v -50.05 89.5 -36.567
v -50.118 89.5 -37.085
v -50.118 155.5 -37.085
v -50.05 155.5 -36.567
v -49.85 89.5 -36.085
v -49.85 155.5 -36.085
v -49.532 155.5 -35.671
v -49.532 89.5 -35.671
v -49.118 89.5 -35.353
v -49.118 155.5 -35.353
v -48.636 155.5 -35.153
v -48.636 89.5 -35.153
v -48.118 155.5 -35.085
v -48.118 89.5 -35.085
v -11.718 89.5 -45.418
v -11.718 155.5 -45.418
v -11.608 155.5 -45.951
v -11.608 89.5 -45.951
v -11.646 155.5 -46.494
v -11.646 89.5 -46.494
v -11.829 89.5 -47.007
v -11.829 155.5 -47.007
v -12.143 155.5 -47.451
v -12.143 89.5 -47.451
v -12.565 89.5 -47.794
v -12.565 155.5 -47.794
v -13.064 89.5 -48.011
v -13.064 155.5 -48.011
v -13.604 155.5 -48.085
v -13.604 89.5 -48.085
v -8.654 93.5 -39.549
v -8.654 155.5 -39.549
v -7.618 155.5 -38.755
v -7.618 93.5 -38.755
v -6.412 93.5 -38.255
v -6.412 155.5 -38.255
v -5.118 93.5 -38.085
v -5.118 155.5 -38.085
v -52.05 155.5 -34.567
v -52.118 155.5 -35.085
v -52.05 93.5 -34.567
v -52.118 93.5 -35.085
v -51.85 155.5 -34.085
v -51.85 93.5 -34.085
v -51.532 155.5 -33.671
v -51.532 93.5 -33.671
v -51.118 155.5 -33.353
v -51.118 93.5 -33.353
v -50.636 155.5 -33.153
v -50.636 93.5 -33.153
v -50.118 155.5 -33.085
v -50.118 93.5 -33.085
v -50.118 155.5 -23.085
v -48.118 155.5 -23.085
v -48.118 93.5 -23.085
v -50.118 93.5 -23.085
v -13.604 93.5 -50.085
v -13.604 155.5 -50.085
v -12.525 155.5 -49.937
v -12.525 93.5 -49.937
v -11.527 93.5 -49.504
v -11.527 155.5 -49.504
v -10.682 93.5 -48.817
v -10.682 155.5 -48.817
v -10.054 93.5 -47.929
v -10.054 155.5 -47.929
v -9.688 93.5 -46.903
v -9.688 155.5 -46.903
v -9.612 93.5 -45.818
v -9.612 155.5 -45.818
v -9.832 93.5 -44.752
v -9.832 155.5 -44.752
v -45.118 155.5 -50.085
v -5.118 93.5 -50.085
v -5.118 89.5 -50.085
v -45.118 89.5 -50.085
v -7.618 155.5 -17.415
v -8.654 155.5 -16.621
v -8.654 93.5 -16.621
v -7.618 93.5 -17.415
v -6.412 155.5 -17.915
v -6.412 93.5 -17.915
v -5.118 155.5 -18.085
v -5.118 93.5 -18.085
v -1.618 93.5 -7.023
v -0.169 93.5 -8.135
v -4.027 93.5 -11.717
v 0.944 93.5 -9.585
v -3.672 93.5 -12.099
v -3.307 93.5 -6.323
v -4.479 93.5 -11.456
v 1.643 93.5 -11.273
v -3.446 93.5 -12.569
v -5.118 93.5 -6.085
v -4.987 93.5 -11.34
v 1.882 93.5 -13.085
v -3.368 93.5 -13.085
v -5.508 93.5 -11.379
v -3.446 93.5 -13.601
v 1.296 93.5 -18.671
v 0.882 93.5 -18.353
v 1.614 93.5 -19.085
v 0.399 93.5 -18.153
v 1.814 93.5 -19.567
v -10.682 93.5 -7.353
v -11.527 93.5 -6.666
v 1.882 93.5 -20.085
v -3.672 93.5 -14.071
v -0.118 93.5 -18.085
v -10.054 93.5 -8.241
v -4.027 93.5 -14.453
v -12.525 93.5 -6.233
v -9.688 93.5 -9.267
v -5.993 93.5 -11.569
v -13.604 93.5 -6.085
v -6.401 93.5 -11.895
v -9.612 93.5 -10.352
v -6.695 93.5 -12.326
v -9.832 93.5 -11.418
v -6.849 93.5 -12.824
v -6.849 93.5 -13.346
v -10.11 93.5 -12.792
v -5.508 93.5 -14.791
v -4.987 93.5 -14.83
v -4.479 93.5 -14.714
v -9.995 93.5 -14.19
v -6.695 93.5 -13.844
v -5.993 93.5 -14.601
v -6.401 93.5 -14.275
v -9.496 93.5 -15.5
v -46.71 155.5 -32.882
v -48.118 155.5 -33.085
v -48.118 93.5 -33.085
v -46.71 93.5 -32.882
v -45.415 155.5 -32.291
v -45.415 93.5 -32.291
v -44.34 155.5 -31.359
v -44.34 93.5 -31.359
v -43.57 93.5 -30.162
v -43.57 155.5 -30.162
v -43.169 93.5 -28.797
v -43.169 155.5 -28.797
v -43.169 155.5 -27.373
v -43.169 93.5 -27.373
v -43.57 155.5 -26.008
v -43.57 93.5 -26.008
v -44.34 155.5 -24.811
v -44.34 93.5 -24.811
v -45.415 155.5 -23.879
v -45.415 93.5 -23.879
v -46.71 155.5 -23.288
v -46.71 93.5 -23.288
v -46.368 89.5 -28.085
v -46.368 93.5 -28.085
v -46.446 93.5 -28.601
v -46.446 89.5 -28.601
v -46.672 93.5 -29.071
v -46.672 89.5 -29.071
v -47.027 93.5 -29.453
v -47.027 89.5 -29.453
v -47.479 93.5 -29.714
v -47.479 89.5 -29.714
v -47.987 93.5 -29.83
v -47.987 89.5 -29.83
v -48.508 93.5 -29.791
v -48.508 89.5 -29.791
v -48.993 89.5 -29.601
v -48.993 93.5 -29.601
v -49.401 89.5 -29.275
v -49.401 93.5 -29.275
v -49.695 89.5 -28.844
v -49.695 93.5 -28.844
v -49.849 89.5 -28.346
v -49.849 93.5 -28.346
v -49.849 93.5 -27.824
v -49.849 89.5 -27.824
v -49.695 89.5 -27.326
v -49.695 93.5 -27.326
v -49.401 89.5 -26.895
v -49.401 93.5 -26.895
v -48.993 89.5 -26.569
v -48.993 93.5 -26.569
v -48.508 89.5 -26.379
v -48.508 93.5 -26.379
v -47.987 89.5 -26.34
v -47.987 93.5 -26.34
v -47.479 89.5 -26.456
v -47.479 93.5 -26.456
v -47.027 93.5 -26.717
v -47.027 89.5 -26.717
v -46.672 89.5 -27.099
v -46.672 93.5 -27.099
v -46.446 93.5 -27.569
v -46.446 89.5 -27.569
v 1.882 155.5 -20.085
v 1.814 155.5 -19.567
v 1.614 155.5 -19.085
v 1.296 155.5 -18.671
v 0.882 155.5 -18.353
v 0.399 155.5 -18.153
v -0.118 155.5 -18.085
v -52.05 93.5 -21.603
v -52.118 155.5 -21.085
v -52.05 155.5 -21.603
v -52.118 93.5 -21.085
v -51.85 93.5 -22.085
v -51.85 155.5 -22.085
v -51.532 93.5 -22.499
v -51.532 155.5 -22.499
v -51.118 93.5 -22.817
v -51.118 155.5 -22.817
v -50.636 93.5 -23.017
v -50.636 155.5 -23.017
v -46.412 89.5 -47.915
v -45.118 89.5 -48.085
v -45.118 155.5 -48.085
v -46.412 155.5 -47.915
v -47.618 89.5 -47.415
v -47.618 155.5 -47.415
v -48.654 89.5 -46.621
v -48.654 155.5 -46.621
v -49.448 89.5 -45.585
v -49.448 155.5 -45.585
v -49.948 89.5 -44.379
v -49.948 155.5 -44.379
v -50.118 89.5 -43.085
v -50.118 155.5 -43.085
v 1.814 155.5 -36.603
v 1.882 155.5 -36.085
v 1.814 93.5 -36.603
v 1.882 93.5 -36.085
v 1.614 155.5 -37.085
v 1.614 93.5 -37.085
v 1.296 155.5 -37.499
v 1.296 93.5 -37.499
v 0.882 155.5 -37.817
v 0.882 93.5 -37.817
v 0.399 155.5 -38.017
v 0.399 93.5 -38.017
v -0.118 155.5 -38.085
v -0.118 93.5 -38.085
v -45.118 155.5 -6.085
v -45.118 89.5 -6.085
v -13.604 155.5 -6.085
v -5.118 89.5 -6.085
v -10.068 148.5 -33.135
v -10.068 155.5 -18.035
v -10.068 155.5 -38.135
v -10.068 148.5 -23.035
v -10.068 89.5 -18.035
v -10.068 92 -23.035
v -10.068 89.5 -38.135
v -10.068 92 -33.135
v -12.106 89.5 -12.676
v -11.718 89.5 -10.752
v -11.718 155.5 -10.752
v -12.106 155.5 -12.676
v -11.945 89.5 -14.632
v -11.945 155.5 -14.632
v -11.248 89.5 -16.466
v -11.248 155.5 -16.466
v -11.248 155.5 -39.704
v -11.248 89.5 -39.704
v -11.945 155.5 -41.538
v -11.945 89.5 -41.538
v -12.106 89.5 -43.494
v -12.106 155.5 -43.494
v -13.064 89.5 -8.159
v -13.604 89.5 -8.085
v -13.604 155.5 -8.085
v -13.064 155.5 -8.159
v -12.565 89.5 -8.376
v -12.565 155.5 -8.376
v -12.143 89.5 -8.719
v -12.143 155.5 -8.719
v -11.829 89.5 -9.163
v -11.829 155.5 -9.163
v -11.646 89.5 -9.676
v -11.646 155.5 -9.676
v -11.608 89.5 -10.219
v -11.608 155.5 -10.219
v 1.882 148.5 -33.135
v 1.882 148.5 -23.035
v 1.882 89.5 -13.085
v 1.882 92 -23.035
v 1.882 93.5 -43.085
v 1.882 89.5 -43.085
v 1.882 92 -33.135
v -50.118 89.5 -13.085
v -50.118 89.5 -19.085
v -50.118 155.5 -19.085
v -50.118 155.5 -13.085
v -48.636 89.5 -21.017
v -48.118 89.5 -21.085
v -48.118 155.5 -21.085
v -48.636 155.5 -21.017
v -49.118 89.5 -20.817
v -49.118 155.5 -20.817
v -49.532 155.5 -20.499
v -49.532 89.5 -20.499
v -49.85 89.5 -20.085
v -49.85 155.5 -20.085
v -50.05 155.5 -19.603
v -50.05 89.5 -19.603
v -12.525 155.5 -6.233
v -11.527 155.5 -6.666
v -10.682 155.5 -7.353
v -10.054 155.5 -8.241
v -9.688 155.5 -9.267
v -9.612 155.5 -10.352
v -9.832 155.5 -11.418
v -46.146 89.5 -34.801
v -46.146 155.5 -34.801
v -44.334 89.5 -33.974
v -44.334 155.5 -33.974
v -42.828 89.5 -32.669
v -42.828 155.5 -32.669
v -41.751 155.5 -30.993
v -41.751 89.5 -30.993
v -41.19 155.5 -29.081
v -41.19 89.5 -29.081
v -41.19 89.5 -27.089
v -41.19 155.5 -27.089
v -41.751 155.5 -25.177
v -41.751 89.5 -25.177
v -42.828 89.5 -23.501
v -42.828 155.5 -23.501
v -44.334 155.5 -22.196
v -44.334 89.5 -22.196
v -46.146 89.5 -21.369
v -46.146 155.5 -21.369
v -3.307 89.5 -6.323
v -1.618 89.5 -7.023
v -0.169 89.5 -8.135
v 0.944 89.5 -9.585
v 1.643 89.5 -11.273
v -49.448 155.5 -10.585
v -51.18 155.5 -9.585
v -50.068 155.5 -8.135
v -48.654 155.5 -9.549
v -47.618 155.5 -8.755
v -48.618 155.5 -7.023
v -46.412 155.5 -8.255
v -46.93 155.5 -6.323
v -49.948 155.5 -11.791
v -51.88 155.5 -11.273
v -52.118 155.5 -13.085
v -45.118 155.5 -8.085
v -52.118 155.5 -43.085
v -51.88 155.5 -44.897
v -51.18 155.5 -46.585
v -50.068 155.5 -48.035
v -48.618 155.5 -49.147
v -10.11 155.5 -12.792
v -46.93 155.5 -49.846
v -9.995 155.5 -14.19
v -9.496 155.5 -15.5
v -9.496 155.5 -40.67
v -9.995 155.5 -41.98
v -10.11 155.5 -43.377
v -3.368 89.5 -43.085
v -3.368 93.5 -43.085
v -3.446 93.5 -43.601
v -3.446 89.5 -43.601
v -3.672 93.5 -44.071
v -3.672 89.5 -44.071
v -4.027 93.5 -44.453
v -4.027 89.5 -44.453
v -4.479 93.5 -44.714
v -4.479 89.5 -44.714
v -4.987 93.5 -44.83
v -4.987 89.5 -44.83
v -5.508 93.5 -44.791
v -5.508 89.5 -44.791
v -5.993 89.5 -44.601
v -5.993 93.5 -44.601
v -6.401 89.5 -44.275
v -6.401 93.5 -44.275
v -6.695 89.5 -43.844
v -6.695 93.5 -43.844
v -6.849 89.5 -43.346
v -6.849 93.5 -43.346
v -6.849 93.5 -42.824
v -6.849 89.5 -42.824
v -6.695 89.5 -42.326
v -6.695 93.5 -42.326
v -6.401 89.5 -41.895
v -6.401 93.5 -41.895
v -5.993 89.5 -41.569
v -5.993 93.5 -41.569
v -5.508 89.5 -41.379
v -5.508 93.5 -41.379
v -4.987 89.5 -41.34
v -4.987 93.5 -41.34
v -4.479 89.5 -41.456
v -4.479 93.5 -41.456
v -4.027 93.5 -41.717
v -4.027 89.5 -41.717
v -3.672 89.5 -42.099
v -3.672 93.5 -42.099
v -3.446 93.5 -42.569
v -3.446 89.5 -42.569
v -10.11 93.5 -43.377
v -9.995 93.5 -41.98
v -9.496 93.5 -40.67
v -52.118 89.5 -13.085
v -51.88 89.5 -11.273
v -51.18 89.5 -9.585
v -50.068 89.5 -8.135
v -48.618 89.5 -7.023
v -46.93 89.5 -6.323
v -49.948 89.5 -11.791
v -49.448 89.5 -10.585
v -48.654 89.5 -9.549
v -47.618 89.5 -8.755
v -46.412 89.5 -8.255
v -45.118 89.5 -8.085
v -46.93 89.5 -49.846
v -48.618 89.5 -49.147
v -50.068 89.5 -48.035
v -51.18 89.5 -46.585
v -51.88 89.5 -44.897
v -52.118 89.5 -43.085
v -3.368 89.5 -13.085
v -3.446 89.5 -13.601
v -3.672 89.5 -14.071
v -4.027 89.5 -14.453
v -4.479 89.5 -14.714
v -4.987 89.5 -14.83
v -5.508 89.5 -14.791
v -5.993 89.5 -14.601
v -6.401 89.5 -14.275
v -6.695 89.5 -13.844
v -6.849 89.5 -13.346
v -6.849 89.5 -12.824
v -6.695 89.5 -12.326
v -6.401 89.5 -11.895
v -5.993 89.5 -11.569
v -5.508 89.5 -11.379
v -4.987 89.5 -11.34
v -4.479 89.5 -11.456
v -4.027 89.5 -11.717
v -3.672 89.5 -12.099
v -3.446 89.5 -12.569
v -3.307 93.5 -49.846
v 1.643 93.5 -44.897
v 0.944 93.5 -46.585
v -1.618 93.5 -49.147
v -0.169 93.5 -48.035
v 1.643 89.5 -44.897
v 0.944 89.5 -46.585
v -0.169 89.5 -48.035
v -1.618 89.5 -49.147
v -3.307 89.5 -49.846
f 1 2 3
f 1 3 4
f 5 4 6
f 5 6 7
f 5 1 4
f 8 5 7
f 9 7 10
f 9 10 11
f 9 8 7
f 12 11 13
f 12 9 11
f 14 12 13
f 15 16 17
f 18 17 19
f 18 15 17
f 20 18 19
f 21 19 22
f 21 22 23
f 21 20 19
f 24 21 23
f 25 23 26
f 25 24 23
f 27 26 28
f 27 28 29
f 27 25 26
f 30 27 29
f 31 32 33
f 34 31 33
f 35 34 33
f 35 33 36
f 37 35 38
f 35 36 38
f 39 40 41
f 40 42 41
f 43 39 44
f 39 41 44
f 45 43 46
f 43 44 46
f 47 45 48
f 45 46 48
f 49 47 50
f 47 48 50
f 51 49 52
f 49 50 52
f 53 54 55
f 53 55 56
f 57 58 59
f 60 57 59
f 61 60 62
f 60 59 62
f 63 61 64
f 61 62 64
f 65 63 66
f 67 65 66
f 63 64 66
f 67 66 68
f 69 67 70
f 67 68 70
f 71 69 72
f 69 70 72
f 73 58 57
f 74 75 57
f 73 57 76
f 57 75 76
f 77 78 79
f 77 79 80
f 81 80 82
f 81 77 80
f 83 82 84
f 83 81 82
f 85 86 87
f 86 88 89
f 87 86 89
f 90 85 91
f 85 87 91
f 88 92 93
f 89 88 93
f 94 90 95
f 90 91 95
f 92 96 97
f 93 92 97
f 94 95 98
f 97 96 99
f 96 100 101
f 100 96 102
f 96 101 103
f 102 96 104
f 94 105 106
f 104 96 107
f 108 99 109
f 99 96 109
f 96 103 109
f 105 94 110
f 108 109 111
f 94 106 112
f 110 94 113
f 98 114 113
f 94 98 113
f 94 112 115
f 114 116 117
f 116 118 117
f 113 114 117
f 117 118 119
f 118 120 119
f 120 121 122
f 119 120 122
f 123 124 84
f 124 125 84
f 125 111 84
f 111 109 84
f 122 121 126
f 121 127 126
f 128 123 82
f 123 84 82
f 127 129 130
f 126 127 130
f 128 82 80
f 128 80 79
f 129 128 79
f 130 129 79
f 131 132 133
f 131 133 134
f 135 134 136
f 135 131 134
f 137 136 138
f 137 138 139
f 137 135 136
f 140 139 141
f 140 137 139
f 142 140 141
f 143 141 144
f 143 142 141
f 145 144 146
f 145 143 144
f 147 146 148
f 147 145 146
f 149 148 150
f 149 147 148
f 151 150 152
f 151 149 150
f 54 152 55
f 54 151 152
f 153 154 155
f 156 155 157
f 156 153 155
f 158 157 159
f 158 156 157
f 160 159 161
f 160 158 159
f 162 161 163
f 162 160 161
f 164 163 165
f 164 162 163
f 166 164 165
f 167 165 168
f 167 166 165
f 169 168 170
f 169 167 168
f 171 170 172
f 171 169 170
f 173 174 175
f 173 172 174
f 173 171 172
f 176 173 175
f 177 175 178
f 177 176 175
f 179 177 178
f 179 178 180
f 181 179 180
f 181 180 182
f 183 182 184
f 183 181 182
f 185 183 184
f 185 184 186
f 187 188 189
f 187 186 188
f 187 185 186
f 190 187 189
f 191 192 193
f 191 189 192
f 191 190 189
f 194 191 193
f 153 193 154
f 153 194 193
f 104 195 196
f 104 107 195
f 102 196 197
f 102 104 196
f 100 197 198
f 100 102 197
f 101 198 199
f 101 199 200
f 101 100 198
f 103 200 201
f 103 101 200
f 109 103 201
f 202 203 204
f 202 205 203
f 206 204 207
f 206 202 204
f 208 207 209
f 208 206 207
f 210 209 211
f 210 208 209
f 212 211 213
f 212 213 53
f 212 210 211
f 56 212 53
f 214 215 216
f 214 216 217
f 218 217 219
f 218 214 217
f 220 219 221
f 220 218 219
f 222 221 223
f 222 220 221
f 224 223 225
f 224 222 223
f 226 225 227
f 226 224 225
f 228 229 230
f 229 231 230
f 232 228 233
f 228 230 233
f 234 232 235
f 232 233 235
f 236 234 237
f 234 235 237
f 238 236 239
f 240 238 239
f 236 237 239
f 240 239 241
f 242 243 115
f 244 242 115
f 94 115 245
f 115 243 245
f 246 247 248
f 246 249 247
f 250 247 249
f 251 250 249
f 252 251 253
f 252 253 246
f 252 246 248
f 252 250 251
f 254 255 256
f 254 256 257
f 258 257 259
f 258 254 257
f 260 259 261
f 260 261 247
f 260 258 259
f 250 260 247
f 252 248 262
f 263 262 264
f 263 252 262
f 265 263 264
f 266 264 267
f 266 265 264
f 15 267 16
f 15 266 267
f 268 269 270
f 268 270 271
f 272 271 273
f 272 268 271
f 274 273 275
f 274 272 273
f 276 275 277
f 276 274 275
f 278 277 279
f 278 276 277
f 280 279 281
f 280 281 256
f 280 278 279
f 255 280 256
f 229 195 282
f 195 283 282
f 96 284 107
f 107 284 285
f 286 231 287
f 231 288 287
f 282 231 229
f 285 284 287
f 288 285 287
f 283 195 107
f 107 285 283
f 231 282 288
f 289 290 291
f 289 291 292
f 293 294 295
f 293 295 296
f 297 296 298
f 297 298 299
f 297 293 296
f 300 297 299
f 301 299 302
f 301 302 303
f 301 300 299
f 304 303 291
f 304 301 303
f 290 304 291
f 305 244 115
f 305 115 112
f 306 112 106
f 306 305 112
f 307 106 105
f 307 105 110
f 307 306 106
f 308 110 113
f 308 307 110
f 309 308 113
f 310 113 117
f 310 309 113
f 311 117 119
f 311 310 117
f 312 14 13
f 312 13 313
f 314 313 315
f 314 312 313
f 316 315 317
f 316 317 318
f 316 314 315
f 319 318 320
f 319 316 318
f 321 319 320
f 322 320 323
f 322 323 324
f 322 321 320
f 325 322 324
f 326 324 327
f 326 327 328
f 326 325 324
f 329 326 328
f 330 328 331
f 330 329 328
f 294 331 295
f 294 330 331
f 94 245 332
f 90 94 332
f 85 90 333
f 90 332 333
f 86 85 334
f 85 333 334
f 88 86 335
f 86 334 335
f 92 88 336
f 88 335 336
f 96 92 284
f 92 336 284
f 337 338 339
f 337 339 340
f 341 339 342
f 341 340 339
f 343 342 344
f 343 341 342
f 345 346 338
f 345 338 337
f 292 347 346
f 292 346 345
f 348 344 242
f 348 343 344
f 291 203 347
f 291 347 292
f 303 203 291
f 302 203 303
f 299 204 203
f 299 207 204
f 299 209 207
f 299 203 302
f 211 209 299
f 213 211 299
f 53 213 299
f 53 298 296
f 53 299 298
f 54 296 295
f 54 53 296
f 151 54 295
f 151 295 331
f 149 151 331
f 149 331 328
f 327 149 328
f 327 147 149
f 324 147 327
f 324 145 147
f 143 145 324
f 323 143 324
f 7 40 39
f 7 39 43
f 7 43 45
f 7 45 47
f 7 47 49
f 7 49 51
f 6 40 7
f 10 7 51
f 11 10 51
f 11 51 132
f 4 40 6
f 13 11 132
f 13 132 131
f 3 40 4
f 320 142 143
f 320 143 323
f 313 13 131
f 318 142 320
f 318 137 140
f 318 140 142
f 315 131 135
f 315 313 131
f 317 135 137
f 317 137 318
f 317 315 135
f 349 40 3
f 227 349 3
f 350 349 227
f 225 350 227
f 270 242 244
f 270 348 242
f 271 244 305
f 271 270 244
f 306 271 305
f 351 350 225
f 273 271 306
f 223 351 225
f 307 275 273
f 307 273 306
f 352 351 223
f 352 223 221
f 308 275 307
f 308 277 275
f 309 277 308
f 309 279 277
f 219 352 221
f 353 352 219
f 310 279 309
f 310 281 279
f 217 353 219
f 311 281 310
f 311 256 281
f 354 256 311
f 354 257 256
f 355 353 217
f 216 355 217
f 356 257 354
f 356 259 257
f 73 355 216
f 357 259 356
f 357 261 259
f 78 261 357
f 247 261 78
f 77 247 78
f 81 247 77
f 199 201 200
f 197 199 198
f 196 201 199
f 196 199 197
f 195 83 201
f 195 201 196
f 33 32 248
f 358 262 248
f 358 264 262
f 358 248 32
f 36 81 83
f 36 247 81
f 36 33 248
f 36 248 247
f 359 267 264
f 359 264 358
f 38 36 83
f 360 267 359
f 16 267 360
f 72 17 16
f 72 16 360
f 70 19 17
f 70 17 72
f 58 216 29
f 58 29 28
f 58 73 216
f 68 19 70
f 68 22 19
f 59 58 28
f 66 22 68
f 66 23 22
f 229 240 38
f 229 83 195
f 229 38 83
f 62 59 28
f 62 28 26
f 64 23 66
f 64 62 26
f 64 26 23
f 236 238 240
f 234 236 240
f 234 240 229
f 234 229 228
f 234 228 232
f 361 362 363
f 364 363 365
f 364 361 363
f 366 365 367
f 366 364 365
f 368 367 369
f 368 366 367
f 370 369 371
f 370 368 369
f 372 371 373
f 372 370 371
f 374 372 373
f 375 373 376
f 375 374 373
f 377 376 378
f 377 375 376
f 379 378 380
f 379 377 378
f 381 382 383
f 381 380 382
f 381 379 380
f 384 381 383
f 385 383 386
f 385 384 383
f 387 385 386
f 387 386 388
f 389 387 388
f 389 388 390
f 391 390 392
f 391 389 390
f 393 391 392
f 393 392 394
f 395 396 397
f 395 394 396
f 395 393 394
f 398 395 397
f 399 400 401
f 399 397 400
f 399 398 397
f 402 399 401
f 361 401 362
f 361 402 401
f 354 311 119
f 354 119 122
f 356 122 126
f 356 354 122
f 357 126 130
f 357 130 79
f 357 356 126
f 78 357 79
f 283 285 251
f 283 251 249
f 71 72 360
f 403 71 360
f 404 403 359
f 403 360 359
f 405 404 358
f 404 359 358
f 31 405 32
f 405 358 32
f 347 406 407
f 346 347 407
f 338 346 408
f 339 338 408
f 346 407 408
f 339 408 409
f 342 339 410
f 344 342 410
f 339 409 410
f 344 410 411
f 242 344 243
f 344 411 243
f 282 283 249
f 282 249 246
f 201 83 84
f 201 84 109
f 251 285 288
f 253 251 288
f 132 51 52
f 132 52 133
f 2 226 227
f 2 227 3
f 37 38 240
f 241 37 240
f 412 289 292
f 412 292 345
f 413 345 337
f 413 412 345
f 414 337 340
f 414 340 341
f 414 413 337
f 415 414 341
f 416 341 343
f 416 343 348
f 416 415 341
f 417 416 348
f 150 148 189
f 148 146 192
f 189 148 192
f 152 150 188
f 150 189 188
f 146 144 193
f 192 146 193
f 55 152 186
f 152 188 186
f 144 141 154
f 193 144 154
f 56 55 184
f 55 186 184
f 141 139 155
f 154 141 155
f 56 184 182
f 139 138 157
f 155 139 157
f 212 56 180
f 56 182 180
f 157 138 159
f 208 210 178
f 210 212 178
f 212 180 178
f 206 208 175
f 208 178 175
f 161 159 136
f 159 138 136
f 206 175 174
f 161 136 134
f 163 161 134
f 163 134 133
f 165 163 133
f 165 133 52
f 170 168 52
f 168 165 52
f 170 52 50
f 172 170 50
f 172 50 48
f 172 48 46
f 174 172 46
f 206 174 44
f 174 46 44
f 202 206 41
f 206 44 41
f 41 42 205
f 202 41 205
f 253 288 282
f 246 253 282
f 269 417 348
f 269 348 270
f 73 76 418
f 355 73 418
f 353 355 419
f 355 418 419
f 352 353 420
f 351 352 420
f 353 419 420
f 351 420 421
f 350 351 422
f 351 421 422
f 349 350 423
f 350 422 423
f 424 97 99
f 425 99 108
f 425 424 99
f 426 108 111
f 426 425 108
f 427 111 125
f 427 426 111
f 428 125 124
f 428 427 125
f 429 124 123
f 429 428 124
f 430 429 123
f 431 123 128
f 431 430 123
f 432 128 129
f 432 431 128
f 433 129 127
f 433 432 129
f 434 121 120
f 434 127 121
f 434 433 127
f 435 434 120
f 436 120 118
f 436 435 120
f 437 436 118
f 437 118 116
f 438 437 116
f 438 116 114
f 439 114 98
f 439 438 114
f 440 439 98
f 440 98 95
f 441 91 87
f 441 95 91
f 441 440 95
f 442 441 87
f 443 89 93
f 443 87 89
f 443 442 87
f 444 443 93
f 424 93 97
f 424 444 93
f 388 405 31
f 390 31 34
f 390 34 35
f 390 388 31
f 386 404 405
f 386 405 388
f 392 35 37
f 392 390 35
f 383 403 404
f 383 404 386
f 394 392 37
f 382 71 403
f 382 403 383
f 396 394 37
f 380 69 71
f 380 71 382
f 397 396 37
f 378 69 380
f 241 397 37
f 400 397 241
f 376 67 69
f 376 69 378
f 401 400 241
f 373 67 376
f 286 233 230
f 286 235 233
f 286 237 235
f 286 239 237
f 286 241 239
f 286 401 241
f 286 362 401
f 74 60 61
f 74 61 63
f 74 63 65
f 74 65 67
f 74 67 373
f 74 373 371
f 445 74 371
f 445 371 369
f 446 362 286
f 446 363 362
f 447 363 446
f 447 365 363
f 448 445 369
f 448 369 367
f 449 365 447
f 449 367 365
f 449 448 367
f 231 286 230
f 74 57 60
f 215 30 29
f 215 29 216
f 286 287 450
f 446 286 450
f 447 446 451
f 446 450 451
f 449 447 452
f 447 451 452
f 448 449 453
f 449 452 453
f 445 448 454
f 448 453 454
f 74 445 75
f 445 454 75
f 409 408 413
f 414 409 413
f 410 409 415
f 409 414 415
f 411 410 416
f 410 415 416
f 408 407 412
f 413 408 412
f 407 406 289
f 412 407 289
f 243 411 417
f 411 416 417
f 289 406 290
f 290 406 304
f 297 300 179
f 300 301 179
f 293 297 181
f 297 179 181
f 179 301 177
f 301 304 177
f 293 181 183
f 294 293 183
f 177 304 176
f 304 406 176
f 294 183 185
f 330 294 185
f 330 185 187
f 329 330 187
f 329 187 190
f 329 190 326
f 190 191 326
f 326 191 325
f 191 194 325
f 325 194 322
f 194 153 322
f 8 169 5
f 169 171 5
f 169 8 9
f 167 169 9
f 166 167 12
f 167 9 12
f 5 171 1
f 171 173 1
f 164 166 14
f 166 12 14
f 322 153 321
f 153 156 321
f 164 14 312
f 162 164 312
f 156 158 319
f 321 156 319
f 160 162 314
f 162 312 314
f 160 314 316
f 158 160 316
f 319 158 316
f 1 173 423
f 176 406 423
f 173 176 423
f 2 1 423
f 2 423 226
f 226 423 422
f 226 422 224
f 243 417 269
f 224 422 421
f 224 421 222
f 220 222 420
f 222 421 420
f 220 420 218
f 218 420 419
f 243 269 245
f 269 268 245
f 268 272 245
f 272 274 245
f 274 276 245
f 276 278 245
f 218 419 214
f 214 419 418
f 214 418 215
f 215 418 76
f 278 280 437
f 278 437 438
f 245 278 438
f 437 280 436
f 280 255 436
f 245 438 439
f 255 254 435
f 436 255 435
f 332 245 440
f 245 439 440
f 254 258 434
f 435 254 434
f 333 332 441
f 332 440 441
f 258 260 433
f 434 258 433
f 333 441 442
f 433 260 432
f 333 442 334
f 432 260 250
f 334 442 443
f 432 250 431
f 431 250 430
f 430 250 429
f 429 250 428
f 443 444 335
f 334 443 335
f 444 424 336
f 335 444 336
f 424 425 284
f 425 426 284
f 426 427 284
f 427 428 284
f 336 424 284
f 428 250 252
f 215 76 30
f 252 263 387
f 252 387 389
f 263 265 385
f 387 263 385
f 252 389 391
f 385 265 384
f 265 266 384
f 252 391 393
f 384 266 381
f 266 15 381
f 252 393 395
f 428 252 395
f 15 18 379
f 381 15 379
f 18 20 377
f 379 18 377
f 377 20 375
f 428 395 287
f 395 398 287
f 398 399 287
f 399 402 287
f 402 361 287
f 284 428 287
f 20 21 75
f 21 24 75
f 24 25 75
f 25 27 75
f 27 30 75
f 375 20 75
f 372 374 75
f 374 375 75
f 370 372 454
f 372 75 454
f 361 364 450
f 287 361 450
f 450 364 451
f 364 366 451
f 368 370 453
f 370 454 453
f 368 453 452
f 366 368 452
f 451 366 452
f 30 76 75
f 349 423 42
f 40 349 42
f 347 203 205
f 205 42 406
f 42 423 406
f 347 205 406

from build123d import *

# Parameters (mm, degrees)
CROQUIS1_R              = 1.75
SALIENTE_EXTRUIR1_DEPTH = 2
CROQUIS2_R              = 1.75
SALIENTE_EXTRUIR2_DEPTH = 64
CORTAR_EXTRUIR1_DEPTH   = 62
REDONDEO1_R             = 2
CORTAR_EXTRUIR2_REACH   = 56
CROQUIS5_W              = 10.1
CROQUIS5_H              = 56.5


with BuildPart() as part:
    # Croquis1 → Saliente-Extruir1 (new body)
    with BuildSketch(Plane(origin=(0, 89.4998128, 0), x_dir=(1, 0, 0), z_dir=(0, 1, 0))):
        with BuildLine():
            Line((-45.118250968, 6.084971867), (-5.118250968, 6.084971867))
            ThreePointArc((-5.118250968, 6.084971867), (-0.1685035, 8.135224399), (1.881749032, 13.084971867))
            Line((1.881749032, 13.084971867), (1.881749032, 43.084971867))
            ThreePointArc((1.881749032, 43.084971867), (-0.1685035, 48.034719335), (-5.118250968, 50.084971867))
            Line((-5.118250968, 50.084971867), (-45.118250968, 50.084971867))
            ThreePointArc((-45.118250968, 50.084971867), (-50.067998436, 48.034719335), (-52.118250968, 43.084971867))
            Line((-52.118250968, 43.084971867), (-52.118250968, 13.084971867))
            ThreePointArc((-52.118250968, 13.084971867), (-50.067998436, 8.135224399), (-45.118250968, 6.084971867))
        make_face()
        with Locations((-48.118250968, 28.084971867)):
            Circle(CROQUIS1_R, mode=Mode.SUBTRACT)
        with Locations((-5.118250968, 43.084971867)):
            Circle(CROQUIS1_R, mode=Mode.SUBTRACT)
        with Locations((-5.118250968, 13.084971867)):
            Circle(CROQUIS1_R, mode=Mode.SUBTRACT)
        with BuildLine():
            Line((-45.118250968, 8.084971867), (-13.603532342, 8.084971867))
            ThreePointArc((-13.603532342, 8.084971867), (-11.97053918, 8.930271329), (-11.717914259, 10.751638534))
            ThreePointArc((-11.717914259, 10.751638534), (-11.945259003, 14.631568546), (-10.067998436, 18.034719335))
            Line((-10.067998436, 18.034719335), (-10.067998436, 38.135224399))
            ThreePointArc((-10.067998436, 38.135224399), (-11.945259003, 41.538375188), (-11.717914259, 45.4183052))
            ThreePointArc((-11.717914259, 45.4183052), (-11.97053918, 47.239672405), (-13.603532342, 48.084971867))
            Line((-13.603532342, 48.084971867), (-45.118250968, 48.084971867))
            ThreePointArc((-45.118250968, 48.084971867), (-48.653784874, 46.620505773), (-50.118250968, 43.084971867))
            Line((-50.118250968, 43.084971867), (-50.118250968, 37.084971867))
            ThreePointArc((-50.118250968, 37.084971867), (-49.53246453, 35.670758305), (-48.118250968, 35.084971867))
            ThreePointArc((-48.118250968, 35.084971867), (-41.118250968, 28.084971867), (-48.118250968, 21.084971867))
            ThreePointArc((-48.118250968, 21.084971867), (-49.53246453, 20.499185429), (-50.118250968, 19.084971867))
            Line((-50.118250968, 19.084971867), (-50.118250968, 13.084971867))
            ThreePointArc((-50.118250968, 13.084971867), (-48.653784874, 9.549437961), (-45.118250968, 8.084971867))
        make_face(mode=Mode.SUBTRACT)
    extrude(amount=SALIENTE_EXTRUIR1_DEPTH)

    # Croquis2 → Saliente-Extruir2 (add)
    with BuildSketch(Plane(origin=(0, 91.4998128, 0), x_dir=(1, 0, 0), z_dir=(0, 1, 0))):
        with BuildLine():
            Line((-45.118250968, 6.084971867), (-5.118250968, 6.084971867))
            ThreePointArc((-5.118250968, 6.084971867), (-0.1685035, 8.135224399), (1.881749032, 13.084971867))
            Line((1.881749032, 13.084971867), (1.881749032, 43.084971867))
            ThreePointArc((1.881749032, 43.084971867), (-0.1685035, 48.034719335), (-5.118250968, 50.084971867))
            Line((-5.118250968, 50.084971867), (-45.118250968, 50.084971867))
            ThreePointArc((-45.118250968, 50.084971867), (-50.067998436, 48.034719335), (-52.118250968, 43.084971867))
            Line((-52.118250968, 43.084971867), (-52.118250968, 13.084971867))
            ThreePointArc((-52.118250968, 13.084971867), (-50.067998436, 8.135224399), (-45.118250968, 6.084971867))
        make_face()
        with Locations((-48.118250968, 28.084971867)):
            Circle(CROQUIS2_R, mode=Mode.SUBTRACT)
        with Locations((-5.118250968, 43.084971867)):
            Circle(CROQUIS2_R, mode=Mode.SUBTRACT)
        with Locations((-5.118250968, 13.084971867)):
            Circle(CROQUIS2_R, mode=Mode.SUBTRACT)
        with BuildLine():
            Line((-10.067998436, 18.034719335), (-10.067998436, 38.135224399))
            ThreePointArc((-10.067998436, 38.135224399), (-11.945259003, 41.538375188), (-11.717914259, 45.4183052))
            ThreePointArc((-11.717914259, 45.4183052), (-11.97053918, 47.239672405), (-13.603532342, 48.084971867))
            Line((-13.603532342, 48.084971867), (-45.118250968, 48.084971867))
            ThreePointArc((-45.118250968, 48.084971867), (-48.653784874, 46.620505773), (-50.118250968, 43.084971867))
            Line((-50.118250968, 43.084971867), (-50.118250968, 37.084971867))
            ThreePointArc((-50.118250968, 37.084971867), (-49.53246453, 35.670758305), (-48.118250968, 35.084971867))
            ThreePointArc((-48.118250968, 35.084971867), (-41.118250968, 28.084971867), (-48.118250968, 21.084971867))
            ThreePointArc((-48.118250968, 21.084971867), (-49.53246453, 20.499185429), (-50.118250968, 19.084971867))
            Line((-50.118250968, 19.084971867), (-50.118250968, 13.084971867))
            ThreePointArc((-50.118250968, 13.084971867), (-48.653784874, 9.549437961), (-45.118250968, 8.084971867))
            Line((-45.118250968, 8.084971867), (-13.603532342, 8.084971867))
            ThreePointArc((-13.603532342, 8.084971867), (-11.97053918, 8.930271329), (-11.717914259, 10.751638534))
            ThreePointArc((-11.717914259, 10.751638534), (-11.945259003, 14.631568546), (-10.067998436, 18.034719335))
        make_face(mode=Mode.SUBTRACT)
    extrude(amount=SALIENTE_EXTRUIR2_DEPTH)

    # Croquis3 → Cortar-Extruir1 (cut)
    with BuildSketch(Plane(origin=(0, 155.4998128, 0), x_dir=(1, 0, 0), z_dir=(0, 1, 0))):
        with BuildLine():
            Line((-5.118250968, 38.084971867), (1.881749032, 38.084971867))
            Line((1.881749032, 38.084971867), (1.881749032, 43.084971867))
            ThreePointArc((1.881749032, 43.084971867), (-0.1685035, 48.034719335), (-5.118250968, 50.084971867))
            Line((-5.118250968, 50.084971867), (-13.603532342, 50.084971867))
            ThreePointArc((-13.603532342, 50.084971867), (-10.337546018, 48.394372944), (-9.832296176, 44.751638534))
            ThreePointArc((-9.832296176, 44.751638534), (-9.994685279, 41.980259953), (-8.653784874, 39.549437961))
            ThreePointArc((-8.653784874, 39.549437961), (-7.03166813, 38.465574204), (-5.118250968, 38.084971867))
        make_face()
        with BuildLine():
            Line((-5.118250968, 18.084971867), (1.881749032, 18.084971867))
            Line((1.881749032, 18.084971867), (1.881749032, 13.084971867))
            ThreePointArc((1.881749032, 13.084971867), (-0.1685035, 8.135224399), (-5.118250968, 6.084971867))
            Line((-5.118250968, 6.084971867), (-13.603532342, 6.084971867))
            ThreePointArc((-13.603532342, 6.084971867), (-10.337546018, 7.77557079), (-9.832296176, 11.4183052))
            ThreePointArc((-9.832296176, 11.4183052), (-9.994685279, 14.18968378), (-8.653784874, 16.620505773))
            ThreePointArc((-8.653784874, 16.620505773), (-7.03166813, 17.704369529), (-5.118250968, 18.084971867))
        make_face()
        with BuildLine():
            Line((-48.118250968, 23.084971867), (-52.118250968, 23.084971867))
            Line((-52.118250968, 23.084971867), (-52.118250968, 33.084971867))
            Line((-52.118250968, 33.084971867), (-48.118250968, 33.084971867))
            ThreePointArc((-48.118250968, 33.084971867), (-43.118250968, 28.084971867), (-48.118250968, 23.084971867))
        make_face()
    extrude(amount=-CORTAR_EXTRUIR1_DEPTH, mode=Mode.SUBTRACT)

    # Redondeo1
    redondeo1_edges = [part.edges().sort_by_distance(p)[0] for p in [
        (1.881749032, 124.4998128, -18.084971867),
        (1.881749032, 124.4998128, -38.084971867),
        (-52.118250968, 124.4998128, -23.084971867),
        (-52.118250968, 124.4998128, -33.084971867),
    ]]
    fillet(redondeo1_edges, radius=REDONDEO1_R)

    # Croquis5 → Cortar-Extruir2 (cut, up to next)
    with BuildSketch(Plane(origin=(1.881749032, 0, 0), x_dir=(0, 0, -1), z_dir=(1, 0, 0)), mode=Mode.PRIVATE) as cortar_extruir2_sk1:
        with Locations((28.084971867, 120.2498128)):
            Rectangle(CROQUIS5_W, CROQUIS5_H)
    cortar_extruir2_tool1 = extrude(cortar_extruir2_sk1.sketch, amount=-CORTAR_EXTRUIR2_REACH, mode=Mode.PRIVATE) & part.part
    add(cortar_extruir2_tool1.solids().sort_by_distance((1.881749, 120.249813, -28.084972))[0], mode=Mode.SUBTRACT)


solid = part.part
